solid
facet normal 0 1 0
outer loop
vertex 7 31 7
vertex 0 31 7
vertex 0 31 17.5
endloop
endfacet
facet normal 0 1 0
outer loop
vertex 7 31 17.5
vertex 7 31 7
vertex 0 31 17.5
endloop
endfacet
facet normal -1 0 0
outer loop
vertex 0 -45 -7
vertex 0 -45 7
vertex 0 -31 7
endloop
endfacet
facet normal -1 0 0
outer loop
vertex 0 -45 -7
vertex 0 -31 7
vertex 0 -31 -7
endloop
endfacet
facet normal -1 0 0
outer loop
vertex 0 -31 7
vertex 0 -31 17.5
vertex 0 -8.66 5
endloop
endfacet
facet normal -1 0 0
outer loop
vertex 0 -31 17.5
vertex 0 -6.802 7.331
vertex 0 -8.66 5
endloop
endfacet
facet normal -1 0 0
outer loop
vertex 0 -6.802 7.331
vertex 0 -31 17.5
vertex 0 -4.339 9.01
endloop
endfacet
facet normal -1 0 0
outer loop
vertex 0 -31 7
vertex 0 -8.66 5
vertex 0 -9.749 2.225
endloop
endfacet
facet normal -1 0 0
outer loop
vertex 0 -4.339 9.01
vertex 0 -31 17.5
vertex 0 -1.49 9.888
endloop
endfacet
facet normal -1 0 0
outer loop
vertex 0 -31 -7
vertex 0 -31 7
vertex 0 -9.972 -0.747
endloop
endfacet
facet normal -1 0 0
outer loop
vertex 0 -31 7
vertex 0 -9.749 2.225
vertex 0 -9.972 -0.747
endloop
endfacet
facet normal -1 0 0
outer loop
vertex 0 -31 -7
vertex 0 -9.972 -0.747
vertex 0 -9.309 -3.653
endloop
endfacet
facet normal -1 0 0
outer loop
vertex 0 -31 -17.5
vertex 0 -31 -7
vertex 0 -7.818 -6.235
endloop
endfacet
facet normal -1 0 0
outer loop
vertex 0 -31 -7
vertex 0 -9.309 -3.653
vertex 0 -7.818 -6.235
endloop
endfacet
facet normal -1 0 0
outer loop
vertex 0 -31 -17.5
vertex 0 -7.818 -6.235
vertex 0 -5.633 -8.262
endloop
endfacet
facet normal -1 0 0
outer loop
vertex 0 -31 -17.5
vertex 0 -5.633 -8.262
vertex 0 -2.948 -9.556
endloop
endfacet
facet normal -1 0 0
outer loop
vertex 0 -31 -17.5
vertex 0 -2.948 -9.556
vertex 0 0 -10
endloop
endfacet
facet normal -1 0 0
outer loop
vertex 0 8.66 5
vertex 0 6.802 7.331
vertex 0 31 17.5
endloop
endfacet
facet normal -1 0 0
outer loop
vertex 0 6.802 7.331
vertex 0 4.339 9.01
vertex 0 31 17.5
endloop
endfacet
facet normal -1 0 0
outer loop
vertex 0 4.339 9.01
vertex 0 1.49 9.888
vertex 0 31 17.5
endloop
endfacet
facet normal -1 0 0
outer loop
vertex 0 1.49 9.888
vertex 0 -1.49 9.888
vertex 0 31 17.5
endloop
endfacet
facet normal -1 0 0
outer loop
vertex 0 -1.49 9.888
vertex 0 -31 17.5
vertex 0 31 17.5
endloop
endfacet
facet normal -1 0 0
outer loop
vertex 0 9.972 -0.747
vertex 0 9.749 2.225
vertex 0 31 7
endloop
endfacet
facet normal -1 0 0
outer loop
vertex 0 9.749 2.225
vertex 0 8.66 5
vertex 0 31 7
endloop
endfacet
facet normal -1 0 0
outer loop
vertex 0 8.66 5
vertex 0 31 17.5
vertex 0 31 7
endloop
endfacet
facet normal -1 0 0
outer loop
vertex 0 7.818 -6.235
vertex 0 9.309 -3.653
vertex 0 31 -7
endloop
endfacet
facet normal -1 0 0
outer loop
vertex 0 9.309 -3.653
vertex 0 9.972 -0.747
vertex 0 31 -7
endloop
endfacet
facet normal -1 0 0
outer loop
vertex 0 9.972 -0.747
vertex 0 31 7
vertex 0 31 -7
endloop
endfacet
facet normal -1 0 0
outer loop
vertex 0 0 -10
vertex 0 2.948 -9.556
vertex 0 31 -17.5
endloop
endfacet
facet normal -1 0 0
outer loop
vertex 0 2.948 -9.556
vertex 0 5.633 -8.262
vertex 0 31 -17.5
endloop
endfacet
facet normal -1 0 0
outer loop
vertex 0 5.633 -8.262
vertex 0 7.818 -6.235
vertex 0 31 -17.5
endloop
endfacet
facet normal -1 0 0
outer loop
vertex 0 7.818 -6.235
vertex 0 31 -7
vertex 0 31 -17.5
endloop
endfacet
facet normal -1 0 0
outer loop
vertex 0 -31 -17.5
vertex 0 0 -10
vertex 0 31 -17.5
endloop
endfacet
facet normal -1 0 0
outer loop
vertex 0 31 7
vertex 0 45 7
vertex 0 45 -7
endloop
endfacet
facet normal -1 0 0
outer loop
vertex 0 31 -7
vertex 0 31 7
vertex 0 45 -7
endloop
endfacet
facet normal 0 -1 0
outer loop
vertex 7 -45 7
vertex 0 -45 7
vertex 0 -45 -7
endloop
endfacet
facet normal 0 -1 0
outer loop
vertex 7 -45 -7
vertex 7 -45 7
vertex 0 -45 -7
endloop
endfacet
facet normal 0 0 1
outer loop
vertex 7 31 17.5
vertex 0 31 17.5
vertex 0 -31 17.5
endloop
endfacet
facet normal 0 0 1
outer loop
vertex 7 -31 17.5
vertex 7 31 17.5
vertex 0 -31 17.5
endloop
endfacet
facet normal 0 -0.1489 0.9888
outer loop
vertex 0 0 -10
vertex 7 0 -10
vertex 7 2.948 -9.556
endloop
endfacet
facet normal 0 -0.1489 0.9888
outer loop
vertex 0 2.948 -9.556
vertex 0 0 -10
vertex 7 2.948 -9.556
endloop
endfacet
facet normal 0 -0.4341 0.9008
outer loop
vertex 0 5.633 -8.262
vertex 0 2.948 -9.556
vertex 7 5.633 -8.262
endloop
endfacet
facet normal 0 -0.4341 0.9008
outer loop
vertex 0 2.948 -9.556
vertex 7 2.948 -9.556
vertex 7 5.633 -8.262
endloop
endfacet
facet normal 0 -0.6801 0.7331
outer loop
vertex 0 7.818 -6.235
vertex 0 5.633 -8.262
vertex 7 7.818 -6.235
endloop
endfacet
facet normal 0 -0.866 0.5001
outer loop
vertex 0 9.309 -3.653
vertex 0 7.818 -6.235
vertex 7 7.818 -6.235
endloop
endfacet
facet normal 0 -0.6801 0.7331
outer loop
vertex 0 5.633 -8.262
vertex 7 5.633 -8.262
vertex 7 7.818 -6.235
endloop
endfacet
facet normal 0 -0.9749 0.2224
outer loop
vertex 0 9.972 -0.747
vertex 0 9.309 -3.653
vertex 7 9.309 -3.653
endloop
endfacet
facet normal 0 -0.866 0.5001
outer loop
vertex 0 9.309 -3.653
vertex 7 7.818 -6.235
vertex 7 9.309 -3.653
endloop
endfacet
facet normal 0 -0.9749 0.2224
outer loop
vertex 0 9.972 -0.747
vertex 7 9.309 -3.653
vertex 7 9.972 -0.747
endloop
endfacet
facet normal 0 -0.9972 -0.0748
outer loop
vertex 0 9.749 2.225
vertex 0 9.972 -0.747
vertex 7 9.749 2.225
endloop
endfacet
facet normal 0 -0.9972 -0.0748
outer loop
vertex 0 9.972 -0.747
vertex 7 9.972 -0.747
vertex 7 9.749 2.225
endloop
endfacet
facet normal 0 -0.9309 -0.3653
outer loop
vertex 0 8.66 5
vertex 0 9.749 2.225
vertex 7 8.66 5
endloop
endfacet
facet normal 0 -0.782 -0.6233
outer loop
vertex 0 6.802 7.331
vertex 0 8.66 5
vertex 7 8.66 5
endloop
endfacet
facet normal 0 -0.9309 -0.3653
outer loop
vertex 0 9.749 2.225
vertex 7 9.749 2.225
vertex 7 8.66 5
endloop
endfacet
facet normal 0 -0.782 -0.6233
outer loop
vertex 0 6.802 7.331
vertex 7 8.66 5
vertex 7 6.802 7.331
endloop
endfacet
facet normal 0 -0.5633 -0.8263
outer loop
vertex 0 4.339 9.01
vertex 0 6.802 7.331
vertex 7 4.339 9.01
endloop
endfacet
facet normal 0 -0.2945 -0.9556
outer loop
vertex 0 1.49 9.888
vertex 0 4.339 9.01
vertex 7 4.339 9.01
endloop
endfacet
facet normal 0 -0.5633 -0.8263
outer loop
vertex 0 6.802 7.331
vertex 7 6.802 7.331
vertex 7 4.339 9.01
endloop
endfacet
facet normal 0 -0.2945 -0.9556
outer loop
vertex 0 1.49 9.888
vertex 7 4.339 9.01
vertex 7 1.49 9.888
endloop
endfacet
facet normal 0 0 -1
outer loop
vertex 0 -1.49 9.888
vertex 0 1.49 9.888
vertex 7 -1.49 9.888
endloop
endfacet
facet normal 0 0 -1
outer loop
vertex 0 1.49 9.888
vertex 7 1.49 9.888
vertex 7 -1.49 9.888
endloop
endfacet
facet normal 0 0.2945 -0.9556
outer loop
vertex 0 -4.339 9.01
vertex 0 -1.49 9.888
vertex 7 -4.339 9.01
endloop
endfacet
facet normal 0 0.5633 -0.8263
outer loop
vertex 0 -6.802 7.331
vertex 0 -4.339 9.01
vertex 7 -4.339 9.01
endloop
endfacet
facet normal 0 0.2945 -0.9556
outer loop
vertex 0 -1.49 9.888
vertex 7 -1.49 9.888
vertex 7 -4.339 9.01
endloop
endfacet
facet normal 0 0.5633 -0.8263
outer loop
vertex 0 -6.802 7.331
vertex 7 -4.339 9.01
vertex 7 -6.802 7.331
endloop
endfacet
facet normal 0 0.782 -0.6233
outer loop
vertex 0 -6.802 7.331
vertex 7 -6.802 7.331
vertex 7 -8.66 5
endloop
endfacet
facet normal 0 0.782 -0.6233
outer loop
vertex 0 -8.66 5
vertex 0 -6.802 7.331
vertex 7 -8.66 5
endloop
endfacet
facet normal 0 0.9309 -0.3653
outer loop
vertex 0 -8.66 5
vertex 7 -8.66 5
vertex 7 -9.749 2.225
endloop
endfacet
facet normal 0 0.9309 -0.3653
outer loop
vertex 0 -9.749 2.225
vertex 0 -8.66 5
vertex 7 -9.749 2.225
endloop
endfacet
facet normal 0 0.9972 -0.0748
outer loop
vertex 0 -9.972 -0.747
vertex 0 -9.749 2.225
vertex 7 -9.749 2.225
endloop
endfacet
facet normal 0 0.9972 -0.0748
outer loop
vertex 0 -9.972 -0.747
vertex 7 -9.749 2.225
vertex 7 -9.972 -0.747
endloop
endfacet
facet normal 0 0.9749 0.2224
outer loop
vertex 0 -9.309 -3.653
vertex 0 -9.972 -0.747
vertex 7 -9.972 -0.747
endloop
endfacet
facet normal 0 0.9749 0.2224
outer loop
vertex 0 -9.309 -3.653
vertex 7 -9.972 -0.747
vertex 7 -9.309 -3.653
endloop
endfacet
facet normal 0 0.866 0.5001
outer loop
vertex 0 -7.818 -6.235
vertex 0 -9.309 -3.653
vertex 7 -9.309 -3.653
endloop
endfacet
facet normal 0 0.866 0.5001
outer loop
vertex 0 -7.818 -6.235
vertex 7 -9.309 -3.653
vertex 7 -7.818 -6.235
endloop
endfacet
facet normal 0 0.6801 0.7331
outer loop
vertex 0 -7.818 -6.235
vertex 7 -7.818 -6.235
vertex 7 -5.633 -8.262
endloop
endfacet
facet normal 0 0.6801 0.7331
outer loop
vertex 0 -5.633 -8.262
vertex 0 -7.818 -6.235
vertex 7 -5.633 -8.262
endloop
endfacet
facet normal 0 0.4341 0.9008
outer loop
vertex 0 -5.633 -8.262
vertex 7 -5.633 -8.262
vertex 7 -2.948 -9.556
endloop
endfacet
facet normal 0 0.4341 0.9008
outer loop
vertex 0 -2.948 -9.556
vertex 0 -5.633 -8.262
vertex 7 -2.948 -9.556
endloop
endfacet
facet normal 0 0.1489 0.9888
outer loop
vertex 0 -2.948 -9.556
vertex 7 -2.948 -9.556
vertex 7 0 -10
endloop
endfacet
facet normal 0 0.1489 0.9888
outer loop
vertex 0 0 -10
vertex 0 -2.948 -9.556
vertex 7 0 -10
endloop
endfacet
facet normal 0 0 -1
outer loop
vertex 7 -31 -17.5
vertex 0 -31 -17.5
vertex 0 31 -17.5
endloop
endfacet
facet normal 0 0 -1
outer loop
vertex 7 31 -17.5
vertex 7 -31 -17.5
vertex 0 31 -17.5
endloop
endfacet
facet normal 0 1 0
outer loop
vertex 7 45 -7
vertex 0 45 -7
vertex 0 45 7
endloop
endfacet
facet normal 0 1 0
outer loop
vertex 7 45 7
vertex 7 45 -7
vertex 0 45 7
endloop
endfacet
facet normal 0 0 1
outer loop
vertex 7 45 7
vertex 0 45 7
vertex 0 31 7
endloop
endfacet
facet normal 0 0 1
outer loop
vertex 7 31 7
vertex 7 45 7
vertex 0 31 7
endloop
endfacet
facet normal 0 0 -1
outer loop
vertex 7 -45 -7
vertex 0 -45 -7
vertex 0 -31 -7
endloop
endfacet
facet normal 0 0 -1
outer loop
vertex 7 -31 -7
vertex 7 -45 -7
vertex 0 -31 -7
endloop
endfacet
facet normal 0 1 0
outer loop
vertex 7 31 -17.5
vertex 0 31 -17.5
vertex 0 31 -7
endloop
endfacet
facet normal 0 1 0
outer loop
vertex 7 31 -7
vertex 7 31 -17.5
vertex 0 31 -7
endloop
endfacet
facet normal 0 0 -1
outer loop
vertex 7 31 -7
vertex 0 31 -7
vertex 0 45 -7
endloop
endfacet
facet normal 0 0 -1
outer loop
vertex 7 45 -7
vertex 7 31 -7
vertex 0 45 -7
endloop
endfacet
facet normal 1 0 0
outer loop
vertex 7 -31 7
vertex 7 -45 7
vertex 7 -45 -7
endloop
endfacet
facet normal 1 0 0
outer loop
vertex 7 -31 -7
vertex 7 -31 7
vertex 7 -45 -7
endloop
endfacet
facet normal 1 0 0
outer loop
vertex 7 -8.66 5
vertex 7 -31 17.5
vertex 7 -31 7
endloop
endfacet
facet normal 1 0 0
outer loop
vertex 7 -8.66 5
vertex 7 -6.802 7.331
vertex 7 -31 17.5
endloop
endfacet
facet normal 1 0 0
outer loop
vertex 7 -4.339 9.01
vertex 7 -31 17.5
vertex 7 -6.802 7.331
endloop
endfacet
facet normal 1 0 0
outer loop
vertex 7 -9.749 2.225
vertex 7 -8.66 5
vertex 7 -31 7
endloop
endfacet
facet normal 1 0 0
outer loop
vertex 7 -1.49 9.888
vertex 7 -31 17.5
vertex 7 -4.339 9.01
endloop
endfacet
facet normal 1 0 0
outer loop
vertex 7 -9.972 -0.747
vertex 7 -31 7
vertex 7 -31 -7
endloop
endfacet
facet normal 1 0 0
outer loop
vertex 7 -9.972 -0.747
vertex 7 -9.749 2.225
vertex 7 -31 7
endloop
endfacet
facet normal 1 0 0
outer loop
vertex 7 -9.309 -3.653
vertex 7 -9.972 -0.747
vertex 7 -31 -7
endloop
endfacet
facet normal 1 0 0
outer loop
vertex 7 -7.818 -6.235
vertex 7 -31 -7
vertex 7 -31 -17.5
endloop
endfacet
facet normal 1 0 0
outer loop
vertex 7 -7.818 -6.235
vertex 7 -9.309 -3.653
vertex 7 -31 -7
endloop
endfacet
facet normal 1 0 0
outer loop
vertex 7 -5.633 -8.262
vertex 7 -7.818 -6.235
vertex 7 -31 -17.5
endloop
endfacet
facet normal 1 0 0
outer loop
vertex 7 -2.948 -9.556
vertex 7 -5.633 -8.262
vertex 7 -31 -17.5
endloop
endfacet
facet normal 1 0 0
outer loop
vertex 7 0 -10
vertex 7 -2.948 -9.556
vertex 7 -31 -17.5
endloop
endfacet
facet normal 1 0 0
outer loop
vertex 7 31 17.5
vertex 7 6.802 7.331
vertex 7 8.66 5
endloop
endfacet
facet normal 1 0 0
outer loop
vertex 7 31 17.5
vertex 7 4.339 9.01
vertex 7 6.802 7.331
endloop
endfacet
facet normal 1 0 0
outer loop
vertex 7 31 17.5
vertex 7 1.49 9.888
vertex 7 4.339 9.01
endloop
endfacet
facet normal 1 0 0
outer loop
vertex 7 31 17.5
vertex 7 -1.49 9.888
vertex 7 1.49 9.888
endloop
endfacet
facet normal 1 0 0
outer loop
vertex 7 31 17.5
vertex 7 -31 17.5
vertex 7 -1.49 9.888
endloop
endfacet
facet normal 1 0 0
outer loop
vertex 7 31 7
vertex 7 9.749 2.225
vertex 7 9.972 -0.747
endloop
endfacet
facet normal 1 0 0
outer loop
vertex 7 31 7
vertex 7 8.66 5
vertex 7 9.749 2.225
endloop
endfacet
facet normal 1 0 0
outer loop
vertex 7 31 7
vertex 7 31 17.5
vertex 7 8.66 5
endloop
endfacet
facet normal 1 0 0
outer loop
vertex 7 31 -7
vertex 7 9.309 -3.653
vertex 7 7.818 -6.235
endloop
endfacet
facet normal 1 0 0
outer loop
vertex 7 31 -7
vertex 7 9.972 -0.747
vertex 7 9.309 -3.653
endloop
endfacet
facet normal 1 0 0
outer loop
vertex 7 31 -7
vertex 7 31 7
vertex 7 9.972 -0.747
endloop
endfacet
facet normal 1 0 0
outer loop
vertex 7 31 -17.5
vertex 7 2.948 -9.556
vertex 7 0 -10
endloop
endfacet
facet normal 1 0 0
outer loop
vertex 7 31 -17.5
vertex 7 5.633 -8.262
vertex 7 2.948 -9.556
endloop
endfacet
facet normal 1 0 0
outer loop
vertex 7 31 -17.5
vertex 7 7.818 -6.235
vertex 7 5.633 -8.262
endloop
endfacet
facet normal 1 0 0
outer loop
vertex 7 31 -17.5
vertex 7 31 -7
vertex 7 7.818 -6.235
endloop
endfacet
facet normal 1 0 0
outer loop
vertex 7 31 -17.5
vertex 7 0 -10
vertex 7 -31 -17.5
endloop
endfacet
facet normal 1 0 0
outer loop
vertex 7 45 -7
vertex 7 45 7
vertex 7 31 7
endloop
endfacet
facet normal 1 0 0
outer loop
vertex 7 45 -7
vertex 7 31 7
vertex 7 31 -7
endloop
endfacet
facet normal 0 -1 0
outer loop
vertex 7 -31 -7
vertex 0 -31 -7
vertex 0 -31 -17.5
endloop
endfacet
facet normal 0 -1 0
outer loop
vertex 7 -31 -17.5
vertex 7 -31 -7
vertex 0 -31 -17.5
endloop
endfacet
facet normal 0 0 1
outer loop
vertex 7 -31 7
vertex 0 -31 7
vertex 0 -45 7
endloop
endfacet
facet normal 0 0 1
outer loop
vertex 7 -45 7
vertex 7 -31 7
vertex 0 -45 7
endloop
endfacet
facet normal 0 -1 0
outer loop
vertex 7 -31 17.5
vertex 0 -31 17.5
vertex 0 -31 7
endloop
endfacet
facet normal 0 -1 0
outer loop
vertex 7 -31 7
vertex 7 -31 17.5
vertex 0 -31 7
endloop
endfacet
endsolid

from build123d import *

# Parameters (mm, degrees)
BOSS_EXTRUDE1_DEPTH = 7
SKETCH2_R           = 10
CUT_EXTRUDE1_DEPTH  = 8


with BuildPart() as part:
    # Sketch1 → Boss-Extrude1 (new body)
    with BuildSketch(Plane(origin=(0, 0, 0), x_dir=(0, 0, -1), z_dir=(1, 0, 0))):
        Polygon((-7, -31), (-7, -45), (7, -45), (7, -31), (17.5, -31), (17.5, 31), (7, 31), (7, 45), (-7, 45), (-7, 31), (-17.5, 31), (-17.5, -31), align=None)
    extrude(amount=BOSS_EXTRUDE1_DEPTH)

    # Sketch2 → Cut-Extrude1 (cut, through all)
    with BuildSketch(Plane(origin=(7, 0, 0), x_dir=(0, 0, -1), z_dir=(1, 0, 0))):
        Circle(SKETCH2_R)
    extrude(amount=-CUT_EXTRUDE1_DEPTH, mode=Mode.SUBTRACT)


solid = part.part
